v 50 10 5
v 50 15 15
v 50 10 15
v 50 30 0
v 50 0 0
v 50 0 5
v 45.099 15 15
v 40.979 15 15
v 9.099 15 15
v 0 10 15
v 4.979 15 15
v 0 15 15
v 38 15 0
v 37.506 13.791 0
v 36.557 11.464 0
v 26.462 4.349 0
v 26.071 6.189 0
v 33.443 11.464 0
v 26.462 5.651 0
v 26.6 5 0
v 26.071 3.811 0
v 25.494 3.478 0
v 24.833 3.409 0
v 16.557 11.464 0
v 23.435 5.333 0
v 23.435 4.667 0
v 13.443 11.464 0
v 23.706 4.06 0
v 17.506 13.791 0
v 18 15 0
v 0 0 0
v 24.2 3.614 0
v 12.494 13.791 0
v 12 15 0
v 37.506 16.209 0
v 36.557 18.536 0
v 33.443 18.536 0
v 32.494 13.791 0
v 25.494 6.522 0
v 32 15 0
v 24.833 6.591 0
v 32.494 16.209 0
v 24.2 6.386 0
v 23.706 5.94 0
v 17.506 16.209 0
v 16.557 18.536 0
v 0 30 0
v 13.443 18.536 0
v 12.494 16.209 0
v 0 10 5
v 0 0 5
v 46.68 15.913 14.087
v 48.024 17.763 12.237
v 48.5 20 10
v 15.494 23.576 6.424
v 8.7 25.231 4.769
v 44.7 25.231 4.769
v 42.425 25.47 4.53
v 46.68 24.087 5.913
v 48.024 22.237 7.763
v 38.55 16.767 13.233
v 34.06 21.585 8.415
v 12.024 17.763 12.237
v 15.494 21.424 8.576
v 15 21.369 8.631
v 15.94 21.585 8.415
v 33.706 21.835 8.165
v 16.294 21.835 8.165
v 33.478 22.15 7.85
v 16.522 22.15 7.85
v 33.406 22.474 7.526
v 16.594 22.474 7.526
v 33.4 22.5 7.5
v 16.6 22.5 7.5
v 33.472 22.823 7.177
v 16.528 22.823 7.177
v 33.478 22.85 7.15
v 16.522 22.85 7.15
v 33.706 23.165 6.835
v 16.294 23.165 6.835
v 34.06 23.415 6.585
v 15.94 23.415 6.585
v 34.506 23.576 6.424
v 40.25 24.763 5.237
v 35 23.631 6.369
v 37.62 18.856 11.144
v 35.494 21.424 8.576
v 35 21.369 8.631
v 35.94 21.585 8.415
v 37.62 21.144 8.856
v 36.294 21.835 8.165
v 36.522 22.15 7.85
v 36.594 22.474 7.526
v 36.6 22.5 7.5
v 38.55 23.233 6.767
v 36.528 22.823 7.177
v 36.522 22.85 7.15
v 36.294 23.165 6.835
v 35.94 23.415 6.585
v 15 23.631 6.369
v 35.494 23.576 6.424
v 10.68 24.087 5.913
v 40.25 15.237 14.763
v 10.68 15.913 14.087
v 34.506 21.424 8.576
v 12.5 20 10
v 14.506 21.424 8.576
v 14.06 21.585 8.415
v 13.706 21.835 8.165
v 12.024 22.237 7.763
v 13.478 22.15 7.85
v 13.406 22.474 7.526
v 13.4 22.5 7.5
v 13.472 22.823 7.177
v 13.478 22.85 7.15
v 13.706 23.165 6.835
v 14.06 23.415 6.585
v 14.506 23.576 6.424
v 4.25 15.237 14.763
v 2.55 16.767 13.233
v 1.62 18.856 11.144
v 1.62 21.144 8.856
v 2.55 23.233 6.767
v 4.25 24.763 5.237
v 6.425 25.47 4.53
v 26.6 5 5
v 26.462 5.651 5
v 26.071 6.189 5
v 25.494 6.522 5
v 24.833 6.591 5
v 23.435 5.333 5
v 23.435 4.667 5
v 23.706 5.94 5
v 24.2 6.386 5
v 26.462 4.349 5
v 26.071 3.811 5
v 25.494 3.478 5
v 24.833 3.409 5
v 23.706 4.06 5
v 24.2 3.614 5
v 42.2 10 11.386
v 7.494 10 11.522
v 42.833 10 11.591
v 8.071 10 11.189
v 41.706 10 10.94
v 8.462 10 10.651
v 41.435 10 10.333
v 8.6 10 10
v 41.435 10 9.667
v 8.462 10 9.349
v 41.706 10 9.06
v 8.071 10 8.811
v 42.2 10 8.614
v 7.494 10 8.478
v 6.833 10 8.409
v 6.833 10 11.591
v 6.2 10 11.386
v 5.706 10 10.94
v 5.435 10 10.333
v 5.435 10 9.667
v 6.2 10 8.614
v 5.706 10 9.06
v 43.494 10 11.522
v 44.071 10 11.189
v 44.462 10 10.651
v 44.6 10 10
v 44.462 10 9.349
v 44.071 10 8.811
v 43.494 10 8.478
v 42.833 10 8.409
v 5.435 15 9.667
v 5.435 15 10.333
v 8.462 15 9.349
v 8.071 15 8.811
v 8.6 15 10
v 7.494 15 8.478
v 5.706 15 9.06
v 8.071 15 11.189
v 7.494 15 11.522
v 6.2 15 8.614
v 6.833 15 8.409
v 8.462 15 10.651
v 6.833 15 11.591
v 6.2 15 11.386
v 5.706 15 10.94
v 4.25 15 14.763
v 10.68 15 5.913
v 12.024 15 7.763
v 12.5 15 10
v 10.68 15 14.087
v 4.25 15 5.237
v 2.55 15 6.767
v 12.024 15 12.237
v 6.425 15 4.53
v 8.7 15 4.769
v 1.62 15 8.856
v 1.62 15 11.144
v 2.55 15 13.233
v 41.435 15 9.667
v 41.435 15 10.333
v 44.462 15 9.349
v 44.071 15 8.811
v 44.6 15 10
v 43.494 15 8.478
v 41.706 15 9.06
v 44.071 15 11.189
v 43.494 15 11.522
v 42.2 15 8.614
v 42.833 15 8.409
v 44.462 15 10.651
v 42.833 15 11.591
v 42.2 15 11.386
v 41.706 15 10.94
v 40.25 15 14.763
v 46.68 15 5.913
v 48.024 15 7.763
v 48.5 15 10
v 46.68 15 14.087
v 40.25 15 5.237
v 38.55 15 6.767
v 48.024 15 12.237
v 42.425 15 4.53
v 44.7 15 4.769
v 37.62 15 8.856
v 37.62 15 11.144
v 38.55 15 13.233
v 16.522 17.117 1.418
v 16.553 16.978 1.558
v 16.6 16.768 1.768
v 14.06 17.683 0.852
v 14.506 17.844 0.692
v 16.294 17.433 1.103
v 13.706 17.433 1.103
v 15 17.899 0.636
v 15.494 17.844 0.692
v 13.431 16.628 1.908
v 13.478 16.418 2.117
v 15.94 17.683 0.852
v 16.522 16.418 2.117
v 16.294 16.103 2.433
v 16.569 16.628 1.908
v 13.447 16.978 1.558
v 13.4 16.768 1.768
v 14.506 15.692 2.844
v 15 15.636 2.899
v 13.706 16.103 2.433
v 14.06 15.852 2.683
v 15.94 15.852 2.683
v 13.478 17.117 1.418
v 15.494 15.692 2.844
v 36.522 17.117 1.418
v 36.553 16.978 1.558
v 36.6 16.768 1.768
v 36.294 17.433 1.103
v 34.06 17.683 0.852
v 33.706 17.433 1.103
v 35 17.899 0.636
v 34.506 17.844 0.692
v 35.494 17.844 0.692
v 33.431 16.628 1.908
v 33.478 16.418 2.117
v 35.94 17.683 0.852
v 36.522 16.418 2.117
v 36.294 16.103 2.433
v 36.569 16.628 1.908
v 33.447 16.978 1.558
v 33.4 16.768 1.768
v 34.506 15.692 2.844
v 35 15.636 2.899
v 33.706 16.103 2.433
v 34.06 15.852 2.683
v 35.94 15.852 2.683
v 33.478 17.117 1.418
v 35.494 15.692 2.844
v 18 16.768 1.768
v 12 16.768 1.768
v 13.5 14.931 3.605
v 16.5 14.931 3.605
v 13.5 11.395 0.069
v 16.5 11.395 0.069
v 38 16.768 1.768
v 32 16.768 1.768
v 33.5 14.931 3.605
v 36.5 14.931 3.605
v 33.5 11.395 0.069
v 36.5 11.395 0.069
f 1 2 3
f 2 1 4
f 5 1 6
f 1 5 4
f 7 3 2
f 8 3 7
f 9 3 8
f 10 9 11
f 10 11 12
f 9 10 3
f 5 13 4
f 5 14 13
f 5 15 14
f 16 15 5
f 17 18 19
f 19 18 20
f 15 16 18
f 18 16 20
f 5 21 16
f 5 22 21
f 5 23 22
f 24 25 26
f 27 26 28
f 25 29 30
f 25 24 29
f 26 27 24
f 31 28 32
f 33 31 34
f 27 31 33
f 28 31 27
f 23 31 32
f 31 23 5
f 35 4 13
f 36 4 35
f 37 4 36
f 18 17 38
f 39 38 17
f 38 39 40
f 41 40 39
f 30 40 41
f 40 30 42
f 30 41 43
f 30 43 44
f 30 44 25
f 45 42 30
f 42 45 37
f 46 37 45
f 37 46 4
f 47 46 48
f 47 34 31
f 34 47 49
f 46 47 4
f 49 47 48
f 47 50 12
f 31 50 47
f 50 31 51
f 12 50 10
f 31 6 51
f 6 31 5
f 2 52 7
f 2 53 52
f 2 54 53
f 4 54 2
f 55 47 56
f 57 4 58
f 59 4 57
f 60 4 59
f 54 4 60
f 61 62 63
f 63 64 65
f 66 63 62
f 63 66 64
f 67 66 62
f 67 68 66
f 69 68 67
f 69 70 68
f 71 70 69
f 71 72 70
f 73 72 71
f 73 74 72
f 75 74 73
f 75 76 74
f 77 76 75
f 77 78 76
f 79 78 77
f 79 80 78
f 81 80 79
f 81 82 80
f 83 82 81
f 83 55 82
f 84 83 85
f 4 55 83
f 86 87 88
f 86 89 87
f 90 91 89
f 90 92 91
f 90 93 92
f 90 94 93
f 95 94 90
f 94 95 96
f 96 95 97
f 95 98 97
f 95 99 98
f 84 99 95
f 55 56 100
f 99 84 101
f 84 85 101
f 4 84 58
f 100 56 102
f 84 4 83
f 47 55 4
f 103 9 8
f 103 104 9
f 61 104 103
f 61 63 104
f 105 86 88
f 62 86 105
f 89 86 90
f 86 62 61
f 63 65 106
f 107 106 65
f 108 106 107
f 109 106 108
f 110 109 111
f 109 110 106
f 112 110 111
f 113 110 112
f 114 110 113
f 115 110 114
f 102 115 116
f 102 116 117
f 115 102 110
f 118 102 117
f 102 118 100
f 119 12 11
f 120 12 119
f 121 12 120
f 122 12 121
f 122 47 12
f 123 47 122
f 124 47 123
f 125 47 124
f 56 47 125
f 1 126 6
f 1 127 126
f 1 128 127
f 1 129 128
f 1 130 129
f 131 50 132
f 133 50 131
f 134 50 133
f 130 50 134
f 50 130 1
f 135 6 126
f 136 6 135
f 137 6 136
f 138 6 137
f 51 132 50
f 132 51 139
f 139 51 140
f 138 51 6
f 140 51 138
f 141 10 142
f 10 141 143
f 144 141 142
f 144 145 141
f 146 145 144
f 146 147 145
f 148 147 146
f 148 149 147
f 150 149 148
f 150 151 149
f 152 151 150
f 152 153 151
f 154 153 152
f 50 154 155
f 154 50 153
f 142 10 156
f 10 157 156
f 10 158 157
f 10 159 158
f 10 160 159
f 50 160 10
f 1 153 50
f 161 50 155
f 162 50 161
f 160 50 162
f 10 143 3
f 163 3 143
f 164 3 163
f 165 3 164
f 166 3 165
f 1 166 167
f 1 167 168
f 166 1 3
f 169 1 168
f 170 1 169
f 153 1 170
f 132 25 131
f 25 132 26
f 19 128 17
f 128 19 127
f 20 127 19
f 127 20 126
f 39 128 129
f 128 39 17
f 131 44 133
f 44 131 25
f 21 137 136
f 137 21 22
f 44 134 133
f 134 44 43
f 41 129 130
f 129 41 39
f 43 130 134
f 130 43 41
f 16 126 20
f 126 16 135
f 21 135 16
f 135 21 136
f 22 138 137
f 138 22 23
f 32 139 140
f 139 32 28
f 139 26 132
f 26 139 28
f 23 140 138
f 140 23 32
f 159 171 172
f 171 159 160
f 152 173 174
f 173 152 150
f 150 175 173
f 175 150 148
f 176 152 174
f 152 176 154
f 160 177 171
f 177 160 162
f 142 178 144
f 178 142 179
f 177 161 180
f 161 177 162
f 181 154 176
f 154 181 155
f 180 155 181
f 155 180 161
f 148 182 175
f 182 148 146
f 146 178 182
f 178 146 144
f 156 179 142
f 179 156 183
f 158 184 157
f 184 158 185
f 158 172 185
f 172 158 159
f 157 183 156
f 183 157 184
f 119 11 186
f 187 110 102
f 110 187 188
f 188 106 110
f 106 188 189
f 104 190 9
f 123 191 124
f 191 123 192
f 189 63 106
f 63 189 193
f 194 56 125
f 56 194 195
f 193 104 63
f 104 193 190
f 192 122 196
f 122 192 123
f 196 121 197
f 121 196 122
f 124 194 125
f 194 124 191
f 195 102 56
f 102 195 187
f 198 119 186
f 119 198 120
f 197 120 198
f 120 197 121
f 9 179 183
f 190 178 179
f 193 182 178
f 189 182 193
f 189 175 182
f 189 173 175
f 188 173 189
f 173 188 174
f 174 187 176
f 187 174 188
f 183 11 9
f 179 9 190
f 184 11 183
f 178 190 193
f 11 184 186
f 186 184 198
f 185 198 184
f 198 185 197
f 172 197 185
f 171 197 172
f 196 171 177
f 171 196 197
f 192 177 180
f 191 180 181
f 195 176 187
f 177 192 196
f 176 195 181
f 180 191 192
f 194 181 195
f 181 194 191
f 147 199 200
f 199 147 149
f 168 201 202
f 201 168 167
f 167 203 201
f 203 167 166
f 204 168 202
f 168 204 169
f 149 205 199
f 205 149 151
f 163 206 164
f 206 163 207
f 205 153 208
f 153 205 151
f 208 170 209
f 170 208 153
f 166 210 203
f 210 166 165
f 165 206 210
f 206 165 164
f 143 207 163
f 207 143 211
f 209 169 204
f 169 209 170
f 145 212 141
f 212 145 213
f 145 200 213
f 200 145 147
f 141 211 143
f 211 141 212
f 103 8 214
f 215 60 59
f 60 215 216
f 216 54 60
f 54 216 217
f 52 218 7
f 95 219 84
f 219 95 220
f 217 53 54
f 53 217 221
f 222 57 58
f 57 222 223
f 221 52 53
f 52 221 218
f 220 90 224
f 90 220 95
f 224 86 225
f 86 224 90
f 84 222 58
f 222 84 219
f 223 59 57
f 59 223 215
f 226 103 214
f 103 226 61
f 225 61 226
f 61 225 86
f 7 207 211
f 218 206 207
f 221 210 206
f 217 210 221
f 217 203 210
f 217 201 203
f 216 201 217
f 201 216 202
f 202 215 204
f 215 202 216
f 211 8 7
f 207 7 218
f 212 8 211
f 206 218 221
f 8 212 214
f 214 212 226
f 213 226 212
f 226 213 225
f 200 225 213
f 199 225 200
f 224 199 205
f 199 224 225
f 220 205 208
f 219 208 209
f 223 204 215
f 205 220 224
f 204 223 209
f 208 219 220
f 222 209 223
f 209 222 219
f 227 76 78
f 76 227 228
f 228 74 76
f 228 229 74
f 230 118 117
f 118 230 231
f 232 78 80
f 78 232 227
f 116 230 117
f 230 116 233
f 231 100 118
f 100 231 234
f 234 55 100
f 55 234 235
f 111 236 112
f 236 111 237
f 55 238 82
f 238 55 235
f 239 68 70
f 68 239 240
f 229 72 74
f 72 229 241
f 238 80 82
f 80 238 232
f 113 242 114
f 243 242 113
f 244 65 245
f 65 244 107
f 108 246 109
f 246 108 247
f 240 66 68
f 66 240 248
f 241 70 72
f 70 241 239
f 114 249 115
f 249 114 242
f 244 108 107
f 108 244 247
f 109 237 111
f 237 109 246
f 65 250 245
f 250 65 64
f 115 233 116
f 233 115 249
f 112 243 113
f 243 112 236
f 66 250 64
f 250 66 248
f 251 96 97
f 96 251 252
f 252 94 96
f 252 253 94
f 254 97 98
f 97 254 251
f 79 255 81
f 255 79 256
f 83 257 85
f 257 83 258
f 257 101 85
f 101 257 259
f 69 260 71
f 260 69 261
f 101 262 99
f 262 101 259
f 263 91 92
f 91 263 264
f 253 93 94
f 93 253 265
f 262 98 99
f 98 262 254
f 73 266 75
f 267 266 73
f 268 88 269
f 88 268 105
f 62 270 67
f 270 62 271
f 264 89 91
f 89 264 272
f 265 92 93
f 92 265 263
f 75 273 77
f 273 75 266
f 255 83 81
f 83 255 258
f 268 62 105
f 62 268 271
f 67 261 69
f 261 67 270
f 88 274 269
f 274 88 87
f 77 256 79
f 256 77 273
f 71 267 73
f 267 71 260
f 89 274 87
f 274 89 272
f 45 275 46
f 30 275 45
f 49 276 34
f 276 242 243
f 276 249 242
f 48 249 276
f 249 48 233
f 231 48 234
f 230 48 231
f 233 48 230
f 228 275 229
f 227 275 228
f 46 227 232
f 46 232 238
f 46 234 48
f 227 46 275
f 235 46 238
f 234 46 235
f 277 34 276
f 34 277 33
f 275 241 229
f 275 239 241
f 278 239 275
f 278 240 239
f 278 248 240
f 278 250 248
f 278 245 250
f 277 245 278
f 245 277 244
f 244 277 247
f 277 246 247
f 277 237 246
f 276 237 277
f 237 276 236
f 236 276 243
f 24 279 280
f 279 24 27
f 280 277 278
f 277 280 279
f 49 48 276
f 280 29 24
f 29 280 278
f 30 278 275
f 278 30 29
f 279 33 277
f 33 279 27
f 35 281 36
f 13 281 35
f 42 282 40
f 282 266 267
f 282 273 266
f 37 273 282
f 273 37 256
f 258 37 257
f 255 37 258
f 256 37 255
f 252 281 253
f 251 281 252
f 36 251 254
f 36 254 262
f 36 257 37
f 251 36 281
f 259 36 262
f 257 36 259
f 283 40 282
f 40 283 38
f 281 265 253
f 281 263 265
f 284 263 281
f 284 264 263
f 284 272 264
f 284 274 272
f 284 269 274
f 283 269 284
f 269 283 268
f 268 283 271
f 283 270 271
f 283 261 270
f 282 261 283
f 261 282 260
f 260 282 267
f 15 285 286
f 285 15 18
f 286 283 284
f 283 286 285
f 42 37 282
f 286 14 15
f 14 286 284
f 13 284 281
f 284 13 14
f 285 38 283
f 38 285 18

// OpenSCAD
difference(){
union(){
    cube([50,15,15]);
    translate([50,15,0])rotate([90,-90,-90])
linear_extrude(50)
polygon([[0,0],[15,0],[0,15]]);
}
translate([0,0,5])cube([50,10,10]);

translate([25,5,0])cylinder(d=3.2,h=10,$fn=15);

translate([7,0,10])rotate([-90,0,0])
cylinder(d=3.2,h=100,$fn=15,center=true);
translate([7,15,10])rotate([-90,0,0])
cylinder(d=11,h=100,$fn=15);
translate([43,0,10])rotate([-90,0,0])
cylinder(d=3.2,h=100,$fn=15,center=true);
translate([43,15,10])rotate([-90,0,0])
cylinder(d=11,h=100,$fn=15);

translate([15,15,0])rotate([-45,0,0])
cylinder(d=3.2,h=25,$fn=20,center=true);
translate([35,15,0])rotate([-45,0,0])
cylinder(d=3.2,h=25,$fn=20,center=true);
translate([15,15,0])rotate([-45,0,0])
cylinder(d=6,h=5,$fn=6,center=true);
translate([35,15,0])rotate([-45,0,0])
cylinder(d=6,h=5,$fn=6,center=true);
}
